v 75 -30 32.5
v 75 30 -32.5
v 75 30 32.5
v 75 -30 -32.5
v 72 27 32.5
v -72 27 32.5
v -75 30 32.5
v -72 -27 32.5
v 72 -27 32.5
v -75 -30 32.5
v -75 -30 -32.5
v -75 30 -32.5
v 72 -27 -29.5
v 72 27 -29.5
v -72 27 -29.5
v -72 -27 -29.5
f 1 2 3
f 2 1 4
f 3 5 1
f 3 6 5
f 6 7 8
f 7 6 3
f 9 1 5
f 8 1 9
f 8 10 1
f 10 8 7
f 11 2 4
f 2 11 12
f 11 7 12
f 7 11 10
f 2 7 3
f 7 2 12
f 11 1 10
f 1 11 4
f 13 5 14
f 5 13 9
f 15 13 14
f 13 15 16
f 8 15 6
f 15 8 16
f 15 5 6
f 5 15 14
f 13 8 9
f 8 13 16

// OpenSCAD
// ========================================
// a 15 x 6 x 6.5 cm enclosure with 0.3 cm wall thickness
// NeuroCAD canonical IR; dimensions are millimetres
// ========================================
$fn = 48;

difference() {
  cube(size=[150, 60, 65], center=true);
  translate([0, 0, 1.6]) {
    cube(size=[144, 54, 62.2], center=true);
  }
}
